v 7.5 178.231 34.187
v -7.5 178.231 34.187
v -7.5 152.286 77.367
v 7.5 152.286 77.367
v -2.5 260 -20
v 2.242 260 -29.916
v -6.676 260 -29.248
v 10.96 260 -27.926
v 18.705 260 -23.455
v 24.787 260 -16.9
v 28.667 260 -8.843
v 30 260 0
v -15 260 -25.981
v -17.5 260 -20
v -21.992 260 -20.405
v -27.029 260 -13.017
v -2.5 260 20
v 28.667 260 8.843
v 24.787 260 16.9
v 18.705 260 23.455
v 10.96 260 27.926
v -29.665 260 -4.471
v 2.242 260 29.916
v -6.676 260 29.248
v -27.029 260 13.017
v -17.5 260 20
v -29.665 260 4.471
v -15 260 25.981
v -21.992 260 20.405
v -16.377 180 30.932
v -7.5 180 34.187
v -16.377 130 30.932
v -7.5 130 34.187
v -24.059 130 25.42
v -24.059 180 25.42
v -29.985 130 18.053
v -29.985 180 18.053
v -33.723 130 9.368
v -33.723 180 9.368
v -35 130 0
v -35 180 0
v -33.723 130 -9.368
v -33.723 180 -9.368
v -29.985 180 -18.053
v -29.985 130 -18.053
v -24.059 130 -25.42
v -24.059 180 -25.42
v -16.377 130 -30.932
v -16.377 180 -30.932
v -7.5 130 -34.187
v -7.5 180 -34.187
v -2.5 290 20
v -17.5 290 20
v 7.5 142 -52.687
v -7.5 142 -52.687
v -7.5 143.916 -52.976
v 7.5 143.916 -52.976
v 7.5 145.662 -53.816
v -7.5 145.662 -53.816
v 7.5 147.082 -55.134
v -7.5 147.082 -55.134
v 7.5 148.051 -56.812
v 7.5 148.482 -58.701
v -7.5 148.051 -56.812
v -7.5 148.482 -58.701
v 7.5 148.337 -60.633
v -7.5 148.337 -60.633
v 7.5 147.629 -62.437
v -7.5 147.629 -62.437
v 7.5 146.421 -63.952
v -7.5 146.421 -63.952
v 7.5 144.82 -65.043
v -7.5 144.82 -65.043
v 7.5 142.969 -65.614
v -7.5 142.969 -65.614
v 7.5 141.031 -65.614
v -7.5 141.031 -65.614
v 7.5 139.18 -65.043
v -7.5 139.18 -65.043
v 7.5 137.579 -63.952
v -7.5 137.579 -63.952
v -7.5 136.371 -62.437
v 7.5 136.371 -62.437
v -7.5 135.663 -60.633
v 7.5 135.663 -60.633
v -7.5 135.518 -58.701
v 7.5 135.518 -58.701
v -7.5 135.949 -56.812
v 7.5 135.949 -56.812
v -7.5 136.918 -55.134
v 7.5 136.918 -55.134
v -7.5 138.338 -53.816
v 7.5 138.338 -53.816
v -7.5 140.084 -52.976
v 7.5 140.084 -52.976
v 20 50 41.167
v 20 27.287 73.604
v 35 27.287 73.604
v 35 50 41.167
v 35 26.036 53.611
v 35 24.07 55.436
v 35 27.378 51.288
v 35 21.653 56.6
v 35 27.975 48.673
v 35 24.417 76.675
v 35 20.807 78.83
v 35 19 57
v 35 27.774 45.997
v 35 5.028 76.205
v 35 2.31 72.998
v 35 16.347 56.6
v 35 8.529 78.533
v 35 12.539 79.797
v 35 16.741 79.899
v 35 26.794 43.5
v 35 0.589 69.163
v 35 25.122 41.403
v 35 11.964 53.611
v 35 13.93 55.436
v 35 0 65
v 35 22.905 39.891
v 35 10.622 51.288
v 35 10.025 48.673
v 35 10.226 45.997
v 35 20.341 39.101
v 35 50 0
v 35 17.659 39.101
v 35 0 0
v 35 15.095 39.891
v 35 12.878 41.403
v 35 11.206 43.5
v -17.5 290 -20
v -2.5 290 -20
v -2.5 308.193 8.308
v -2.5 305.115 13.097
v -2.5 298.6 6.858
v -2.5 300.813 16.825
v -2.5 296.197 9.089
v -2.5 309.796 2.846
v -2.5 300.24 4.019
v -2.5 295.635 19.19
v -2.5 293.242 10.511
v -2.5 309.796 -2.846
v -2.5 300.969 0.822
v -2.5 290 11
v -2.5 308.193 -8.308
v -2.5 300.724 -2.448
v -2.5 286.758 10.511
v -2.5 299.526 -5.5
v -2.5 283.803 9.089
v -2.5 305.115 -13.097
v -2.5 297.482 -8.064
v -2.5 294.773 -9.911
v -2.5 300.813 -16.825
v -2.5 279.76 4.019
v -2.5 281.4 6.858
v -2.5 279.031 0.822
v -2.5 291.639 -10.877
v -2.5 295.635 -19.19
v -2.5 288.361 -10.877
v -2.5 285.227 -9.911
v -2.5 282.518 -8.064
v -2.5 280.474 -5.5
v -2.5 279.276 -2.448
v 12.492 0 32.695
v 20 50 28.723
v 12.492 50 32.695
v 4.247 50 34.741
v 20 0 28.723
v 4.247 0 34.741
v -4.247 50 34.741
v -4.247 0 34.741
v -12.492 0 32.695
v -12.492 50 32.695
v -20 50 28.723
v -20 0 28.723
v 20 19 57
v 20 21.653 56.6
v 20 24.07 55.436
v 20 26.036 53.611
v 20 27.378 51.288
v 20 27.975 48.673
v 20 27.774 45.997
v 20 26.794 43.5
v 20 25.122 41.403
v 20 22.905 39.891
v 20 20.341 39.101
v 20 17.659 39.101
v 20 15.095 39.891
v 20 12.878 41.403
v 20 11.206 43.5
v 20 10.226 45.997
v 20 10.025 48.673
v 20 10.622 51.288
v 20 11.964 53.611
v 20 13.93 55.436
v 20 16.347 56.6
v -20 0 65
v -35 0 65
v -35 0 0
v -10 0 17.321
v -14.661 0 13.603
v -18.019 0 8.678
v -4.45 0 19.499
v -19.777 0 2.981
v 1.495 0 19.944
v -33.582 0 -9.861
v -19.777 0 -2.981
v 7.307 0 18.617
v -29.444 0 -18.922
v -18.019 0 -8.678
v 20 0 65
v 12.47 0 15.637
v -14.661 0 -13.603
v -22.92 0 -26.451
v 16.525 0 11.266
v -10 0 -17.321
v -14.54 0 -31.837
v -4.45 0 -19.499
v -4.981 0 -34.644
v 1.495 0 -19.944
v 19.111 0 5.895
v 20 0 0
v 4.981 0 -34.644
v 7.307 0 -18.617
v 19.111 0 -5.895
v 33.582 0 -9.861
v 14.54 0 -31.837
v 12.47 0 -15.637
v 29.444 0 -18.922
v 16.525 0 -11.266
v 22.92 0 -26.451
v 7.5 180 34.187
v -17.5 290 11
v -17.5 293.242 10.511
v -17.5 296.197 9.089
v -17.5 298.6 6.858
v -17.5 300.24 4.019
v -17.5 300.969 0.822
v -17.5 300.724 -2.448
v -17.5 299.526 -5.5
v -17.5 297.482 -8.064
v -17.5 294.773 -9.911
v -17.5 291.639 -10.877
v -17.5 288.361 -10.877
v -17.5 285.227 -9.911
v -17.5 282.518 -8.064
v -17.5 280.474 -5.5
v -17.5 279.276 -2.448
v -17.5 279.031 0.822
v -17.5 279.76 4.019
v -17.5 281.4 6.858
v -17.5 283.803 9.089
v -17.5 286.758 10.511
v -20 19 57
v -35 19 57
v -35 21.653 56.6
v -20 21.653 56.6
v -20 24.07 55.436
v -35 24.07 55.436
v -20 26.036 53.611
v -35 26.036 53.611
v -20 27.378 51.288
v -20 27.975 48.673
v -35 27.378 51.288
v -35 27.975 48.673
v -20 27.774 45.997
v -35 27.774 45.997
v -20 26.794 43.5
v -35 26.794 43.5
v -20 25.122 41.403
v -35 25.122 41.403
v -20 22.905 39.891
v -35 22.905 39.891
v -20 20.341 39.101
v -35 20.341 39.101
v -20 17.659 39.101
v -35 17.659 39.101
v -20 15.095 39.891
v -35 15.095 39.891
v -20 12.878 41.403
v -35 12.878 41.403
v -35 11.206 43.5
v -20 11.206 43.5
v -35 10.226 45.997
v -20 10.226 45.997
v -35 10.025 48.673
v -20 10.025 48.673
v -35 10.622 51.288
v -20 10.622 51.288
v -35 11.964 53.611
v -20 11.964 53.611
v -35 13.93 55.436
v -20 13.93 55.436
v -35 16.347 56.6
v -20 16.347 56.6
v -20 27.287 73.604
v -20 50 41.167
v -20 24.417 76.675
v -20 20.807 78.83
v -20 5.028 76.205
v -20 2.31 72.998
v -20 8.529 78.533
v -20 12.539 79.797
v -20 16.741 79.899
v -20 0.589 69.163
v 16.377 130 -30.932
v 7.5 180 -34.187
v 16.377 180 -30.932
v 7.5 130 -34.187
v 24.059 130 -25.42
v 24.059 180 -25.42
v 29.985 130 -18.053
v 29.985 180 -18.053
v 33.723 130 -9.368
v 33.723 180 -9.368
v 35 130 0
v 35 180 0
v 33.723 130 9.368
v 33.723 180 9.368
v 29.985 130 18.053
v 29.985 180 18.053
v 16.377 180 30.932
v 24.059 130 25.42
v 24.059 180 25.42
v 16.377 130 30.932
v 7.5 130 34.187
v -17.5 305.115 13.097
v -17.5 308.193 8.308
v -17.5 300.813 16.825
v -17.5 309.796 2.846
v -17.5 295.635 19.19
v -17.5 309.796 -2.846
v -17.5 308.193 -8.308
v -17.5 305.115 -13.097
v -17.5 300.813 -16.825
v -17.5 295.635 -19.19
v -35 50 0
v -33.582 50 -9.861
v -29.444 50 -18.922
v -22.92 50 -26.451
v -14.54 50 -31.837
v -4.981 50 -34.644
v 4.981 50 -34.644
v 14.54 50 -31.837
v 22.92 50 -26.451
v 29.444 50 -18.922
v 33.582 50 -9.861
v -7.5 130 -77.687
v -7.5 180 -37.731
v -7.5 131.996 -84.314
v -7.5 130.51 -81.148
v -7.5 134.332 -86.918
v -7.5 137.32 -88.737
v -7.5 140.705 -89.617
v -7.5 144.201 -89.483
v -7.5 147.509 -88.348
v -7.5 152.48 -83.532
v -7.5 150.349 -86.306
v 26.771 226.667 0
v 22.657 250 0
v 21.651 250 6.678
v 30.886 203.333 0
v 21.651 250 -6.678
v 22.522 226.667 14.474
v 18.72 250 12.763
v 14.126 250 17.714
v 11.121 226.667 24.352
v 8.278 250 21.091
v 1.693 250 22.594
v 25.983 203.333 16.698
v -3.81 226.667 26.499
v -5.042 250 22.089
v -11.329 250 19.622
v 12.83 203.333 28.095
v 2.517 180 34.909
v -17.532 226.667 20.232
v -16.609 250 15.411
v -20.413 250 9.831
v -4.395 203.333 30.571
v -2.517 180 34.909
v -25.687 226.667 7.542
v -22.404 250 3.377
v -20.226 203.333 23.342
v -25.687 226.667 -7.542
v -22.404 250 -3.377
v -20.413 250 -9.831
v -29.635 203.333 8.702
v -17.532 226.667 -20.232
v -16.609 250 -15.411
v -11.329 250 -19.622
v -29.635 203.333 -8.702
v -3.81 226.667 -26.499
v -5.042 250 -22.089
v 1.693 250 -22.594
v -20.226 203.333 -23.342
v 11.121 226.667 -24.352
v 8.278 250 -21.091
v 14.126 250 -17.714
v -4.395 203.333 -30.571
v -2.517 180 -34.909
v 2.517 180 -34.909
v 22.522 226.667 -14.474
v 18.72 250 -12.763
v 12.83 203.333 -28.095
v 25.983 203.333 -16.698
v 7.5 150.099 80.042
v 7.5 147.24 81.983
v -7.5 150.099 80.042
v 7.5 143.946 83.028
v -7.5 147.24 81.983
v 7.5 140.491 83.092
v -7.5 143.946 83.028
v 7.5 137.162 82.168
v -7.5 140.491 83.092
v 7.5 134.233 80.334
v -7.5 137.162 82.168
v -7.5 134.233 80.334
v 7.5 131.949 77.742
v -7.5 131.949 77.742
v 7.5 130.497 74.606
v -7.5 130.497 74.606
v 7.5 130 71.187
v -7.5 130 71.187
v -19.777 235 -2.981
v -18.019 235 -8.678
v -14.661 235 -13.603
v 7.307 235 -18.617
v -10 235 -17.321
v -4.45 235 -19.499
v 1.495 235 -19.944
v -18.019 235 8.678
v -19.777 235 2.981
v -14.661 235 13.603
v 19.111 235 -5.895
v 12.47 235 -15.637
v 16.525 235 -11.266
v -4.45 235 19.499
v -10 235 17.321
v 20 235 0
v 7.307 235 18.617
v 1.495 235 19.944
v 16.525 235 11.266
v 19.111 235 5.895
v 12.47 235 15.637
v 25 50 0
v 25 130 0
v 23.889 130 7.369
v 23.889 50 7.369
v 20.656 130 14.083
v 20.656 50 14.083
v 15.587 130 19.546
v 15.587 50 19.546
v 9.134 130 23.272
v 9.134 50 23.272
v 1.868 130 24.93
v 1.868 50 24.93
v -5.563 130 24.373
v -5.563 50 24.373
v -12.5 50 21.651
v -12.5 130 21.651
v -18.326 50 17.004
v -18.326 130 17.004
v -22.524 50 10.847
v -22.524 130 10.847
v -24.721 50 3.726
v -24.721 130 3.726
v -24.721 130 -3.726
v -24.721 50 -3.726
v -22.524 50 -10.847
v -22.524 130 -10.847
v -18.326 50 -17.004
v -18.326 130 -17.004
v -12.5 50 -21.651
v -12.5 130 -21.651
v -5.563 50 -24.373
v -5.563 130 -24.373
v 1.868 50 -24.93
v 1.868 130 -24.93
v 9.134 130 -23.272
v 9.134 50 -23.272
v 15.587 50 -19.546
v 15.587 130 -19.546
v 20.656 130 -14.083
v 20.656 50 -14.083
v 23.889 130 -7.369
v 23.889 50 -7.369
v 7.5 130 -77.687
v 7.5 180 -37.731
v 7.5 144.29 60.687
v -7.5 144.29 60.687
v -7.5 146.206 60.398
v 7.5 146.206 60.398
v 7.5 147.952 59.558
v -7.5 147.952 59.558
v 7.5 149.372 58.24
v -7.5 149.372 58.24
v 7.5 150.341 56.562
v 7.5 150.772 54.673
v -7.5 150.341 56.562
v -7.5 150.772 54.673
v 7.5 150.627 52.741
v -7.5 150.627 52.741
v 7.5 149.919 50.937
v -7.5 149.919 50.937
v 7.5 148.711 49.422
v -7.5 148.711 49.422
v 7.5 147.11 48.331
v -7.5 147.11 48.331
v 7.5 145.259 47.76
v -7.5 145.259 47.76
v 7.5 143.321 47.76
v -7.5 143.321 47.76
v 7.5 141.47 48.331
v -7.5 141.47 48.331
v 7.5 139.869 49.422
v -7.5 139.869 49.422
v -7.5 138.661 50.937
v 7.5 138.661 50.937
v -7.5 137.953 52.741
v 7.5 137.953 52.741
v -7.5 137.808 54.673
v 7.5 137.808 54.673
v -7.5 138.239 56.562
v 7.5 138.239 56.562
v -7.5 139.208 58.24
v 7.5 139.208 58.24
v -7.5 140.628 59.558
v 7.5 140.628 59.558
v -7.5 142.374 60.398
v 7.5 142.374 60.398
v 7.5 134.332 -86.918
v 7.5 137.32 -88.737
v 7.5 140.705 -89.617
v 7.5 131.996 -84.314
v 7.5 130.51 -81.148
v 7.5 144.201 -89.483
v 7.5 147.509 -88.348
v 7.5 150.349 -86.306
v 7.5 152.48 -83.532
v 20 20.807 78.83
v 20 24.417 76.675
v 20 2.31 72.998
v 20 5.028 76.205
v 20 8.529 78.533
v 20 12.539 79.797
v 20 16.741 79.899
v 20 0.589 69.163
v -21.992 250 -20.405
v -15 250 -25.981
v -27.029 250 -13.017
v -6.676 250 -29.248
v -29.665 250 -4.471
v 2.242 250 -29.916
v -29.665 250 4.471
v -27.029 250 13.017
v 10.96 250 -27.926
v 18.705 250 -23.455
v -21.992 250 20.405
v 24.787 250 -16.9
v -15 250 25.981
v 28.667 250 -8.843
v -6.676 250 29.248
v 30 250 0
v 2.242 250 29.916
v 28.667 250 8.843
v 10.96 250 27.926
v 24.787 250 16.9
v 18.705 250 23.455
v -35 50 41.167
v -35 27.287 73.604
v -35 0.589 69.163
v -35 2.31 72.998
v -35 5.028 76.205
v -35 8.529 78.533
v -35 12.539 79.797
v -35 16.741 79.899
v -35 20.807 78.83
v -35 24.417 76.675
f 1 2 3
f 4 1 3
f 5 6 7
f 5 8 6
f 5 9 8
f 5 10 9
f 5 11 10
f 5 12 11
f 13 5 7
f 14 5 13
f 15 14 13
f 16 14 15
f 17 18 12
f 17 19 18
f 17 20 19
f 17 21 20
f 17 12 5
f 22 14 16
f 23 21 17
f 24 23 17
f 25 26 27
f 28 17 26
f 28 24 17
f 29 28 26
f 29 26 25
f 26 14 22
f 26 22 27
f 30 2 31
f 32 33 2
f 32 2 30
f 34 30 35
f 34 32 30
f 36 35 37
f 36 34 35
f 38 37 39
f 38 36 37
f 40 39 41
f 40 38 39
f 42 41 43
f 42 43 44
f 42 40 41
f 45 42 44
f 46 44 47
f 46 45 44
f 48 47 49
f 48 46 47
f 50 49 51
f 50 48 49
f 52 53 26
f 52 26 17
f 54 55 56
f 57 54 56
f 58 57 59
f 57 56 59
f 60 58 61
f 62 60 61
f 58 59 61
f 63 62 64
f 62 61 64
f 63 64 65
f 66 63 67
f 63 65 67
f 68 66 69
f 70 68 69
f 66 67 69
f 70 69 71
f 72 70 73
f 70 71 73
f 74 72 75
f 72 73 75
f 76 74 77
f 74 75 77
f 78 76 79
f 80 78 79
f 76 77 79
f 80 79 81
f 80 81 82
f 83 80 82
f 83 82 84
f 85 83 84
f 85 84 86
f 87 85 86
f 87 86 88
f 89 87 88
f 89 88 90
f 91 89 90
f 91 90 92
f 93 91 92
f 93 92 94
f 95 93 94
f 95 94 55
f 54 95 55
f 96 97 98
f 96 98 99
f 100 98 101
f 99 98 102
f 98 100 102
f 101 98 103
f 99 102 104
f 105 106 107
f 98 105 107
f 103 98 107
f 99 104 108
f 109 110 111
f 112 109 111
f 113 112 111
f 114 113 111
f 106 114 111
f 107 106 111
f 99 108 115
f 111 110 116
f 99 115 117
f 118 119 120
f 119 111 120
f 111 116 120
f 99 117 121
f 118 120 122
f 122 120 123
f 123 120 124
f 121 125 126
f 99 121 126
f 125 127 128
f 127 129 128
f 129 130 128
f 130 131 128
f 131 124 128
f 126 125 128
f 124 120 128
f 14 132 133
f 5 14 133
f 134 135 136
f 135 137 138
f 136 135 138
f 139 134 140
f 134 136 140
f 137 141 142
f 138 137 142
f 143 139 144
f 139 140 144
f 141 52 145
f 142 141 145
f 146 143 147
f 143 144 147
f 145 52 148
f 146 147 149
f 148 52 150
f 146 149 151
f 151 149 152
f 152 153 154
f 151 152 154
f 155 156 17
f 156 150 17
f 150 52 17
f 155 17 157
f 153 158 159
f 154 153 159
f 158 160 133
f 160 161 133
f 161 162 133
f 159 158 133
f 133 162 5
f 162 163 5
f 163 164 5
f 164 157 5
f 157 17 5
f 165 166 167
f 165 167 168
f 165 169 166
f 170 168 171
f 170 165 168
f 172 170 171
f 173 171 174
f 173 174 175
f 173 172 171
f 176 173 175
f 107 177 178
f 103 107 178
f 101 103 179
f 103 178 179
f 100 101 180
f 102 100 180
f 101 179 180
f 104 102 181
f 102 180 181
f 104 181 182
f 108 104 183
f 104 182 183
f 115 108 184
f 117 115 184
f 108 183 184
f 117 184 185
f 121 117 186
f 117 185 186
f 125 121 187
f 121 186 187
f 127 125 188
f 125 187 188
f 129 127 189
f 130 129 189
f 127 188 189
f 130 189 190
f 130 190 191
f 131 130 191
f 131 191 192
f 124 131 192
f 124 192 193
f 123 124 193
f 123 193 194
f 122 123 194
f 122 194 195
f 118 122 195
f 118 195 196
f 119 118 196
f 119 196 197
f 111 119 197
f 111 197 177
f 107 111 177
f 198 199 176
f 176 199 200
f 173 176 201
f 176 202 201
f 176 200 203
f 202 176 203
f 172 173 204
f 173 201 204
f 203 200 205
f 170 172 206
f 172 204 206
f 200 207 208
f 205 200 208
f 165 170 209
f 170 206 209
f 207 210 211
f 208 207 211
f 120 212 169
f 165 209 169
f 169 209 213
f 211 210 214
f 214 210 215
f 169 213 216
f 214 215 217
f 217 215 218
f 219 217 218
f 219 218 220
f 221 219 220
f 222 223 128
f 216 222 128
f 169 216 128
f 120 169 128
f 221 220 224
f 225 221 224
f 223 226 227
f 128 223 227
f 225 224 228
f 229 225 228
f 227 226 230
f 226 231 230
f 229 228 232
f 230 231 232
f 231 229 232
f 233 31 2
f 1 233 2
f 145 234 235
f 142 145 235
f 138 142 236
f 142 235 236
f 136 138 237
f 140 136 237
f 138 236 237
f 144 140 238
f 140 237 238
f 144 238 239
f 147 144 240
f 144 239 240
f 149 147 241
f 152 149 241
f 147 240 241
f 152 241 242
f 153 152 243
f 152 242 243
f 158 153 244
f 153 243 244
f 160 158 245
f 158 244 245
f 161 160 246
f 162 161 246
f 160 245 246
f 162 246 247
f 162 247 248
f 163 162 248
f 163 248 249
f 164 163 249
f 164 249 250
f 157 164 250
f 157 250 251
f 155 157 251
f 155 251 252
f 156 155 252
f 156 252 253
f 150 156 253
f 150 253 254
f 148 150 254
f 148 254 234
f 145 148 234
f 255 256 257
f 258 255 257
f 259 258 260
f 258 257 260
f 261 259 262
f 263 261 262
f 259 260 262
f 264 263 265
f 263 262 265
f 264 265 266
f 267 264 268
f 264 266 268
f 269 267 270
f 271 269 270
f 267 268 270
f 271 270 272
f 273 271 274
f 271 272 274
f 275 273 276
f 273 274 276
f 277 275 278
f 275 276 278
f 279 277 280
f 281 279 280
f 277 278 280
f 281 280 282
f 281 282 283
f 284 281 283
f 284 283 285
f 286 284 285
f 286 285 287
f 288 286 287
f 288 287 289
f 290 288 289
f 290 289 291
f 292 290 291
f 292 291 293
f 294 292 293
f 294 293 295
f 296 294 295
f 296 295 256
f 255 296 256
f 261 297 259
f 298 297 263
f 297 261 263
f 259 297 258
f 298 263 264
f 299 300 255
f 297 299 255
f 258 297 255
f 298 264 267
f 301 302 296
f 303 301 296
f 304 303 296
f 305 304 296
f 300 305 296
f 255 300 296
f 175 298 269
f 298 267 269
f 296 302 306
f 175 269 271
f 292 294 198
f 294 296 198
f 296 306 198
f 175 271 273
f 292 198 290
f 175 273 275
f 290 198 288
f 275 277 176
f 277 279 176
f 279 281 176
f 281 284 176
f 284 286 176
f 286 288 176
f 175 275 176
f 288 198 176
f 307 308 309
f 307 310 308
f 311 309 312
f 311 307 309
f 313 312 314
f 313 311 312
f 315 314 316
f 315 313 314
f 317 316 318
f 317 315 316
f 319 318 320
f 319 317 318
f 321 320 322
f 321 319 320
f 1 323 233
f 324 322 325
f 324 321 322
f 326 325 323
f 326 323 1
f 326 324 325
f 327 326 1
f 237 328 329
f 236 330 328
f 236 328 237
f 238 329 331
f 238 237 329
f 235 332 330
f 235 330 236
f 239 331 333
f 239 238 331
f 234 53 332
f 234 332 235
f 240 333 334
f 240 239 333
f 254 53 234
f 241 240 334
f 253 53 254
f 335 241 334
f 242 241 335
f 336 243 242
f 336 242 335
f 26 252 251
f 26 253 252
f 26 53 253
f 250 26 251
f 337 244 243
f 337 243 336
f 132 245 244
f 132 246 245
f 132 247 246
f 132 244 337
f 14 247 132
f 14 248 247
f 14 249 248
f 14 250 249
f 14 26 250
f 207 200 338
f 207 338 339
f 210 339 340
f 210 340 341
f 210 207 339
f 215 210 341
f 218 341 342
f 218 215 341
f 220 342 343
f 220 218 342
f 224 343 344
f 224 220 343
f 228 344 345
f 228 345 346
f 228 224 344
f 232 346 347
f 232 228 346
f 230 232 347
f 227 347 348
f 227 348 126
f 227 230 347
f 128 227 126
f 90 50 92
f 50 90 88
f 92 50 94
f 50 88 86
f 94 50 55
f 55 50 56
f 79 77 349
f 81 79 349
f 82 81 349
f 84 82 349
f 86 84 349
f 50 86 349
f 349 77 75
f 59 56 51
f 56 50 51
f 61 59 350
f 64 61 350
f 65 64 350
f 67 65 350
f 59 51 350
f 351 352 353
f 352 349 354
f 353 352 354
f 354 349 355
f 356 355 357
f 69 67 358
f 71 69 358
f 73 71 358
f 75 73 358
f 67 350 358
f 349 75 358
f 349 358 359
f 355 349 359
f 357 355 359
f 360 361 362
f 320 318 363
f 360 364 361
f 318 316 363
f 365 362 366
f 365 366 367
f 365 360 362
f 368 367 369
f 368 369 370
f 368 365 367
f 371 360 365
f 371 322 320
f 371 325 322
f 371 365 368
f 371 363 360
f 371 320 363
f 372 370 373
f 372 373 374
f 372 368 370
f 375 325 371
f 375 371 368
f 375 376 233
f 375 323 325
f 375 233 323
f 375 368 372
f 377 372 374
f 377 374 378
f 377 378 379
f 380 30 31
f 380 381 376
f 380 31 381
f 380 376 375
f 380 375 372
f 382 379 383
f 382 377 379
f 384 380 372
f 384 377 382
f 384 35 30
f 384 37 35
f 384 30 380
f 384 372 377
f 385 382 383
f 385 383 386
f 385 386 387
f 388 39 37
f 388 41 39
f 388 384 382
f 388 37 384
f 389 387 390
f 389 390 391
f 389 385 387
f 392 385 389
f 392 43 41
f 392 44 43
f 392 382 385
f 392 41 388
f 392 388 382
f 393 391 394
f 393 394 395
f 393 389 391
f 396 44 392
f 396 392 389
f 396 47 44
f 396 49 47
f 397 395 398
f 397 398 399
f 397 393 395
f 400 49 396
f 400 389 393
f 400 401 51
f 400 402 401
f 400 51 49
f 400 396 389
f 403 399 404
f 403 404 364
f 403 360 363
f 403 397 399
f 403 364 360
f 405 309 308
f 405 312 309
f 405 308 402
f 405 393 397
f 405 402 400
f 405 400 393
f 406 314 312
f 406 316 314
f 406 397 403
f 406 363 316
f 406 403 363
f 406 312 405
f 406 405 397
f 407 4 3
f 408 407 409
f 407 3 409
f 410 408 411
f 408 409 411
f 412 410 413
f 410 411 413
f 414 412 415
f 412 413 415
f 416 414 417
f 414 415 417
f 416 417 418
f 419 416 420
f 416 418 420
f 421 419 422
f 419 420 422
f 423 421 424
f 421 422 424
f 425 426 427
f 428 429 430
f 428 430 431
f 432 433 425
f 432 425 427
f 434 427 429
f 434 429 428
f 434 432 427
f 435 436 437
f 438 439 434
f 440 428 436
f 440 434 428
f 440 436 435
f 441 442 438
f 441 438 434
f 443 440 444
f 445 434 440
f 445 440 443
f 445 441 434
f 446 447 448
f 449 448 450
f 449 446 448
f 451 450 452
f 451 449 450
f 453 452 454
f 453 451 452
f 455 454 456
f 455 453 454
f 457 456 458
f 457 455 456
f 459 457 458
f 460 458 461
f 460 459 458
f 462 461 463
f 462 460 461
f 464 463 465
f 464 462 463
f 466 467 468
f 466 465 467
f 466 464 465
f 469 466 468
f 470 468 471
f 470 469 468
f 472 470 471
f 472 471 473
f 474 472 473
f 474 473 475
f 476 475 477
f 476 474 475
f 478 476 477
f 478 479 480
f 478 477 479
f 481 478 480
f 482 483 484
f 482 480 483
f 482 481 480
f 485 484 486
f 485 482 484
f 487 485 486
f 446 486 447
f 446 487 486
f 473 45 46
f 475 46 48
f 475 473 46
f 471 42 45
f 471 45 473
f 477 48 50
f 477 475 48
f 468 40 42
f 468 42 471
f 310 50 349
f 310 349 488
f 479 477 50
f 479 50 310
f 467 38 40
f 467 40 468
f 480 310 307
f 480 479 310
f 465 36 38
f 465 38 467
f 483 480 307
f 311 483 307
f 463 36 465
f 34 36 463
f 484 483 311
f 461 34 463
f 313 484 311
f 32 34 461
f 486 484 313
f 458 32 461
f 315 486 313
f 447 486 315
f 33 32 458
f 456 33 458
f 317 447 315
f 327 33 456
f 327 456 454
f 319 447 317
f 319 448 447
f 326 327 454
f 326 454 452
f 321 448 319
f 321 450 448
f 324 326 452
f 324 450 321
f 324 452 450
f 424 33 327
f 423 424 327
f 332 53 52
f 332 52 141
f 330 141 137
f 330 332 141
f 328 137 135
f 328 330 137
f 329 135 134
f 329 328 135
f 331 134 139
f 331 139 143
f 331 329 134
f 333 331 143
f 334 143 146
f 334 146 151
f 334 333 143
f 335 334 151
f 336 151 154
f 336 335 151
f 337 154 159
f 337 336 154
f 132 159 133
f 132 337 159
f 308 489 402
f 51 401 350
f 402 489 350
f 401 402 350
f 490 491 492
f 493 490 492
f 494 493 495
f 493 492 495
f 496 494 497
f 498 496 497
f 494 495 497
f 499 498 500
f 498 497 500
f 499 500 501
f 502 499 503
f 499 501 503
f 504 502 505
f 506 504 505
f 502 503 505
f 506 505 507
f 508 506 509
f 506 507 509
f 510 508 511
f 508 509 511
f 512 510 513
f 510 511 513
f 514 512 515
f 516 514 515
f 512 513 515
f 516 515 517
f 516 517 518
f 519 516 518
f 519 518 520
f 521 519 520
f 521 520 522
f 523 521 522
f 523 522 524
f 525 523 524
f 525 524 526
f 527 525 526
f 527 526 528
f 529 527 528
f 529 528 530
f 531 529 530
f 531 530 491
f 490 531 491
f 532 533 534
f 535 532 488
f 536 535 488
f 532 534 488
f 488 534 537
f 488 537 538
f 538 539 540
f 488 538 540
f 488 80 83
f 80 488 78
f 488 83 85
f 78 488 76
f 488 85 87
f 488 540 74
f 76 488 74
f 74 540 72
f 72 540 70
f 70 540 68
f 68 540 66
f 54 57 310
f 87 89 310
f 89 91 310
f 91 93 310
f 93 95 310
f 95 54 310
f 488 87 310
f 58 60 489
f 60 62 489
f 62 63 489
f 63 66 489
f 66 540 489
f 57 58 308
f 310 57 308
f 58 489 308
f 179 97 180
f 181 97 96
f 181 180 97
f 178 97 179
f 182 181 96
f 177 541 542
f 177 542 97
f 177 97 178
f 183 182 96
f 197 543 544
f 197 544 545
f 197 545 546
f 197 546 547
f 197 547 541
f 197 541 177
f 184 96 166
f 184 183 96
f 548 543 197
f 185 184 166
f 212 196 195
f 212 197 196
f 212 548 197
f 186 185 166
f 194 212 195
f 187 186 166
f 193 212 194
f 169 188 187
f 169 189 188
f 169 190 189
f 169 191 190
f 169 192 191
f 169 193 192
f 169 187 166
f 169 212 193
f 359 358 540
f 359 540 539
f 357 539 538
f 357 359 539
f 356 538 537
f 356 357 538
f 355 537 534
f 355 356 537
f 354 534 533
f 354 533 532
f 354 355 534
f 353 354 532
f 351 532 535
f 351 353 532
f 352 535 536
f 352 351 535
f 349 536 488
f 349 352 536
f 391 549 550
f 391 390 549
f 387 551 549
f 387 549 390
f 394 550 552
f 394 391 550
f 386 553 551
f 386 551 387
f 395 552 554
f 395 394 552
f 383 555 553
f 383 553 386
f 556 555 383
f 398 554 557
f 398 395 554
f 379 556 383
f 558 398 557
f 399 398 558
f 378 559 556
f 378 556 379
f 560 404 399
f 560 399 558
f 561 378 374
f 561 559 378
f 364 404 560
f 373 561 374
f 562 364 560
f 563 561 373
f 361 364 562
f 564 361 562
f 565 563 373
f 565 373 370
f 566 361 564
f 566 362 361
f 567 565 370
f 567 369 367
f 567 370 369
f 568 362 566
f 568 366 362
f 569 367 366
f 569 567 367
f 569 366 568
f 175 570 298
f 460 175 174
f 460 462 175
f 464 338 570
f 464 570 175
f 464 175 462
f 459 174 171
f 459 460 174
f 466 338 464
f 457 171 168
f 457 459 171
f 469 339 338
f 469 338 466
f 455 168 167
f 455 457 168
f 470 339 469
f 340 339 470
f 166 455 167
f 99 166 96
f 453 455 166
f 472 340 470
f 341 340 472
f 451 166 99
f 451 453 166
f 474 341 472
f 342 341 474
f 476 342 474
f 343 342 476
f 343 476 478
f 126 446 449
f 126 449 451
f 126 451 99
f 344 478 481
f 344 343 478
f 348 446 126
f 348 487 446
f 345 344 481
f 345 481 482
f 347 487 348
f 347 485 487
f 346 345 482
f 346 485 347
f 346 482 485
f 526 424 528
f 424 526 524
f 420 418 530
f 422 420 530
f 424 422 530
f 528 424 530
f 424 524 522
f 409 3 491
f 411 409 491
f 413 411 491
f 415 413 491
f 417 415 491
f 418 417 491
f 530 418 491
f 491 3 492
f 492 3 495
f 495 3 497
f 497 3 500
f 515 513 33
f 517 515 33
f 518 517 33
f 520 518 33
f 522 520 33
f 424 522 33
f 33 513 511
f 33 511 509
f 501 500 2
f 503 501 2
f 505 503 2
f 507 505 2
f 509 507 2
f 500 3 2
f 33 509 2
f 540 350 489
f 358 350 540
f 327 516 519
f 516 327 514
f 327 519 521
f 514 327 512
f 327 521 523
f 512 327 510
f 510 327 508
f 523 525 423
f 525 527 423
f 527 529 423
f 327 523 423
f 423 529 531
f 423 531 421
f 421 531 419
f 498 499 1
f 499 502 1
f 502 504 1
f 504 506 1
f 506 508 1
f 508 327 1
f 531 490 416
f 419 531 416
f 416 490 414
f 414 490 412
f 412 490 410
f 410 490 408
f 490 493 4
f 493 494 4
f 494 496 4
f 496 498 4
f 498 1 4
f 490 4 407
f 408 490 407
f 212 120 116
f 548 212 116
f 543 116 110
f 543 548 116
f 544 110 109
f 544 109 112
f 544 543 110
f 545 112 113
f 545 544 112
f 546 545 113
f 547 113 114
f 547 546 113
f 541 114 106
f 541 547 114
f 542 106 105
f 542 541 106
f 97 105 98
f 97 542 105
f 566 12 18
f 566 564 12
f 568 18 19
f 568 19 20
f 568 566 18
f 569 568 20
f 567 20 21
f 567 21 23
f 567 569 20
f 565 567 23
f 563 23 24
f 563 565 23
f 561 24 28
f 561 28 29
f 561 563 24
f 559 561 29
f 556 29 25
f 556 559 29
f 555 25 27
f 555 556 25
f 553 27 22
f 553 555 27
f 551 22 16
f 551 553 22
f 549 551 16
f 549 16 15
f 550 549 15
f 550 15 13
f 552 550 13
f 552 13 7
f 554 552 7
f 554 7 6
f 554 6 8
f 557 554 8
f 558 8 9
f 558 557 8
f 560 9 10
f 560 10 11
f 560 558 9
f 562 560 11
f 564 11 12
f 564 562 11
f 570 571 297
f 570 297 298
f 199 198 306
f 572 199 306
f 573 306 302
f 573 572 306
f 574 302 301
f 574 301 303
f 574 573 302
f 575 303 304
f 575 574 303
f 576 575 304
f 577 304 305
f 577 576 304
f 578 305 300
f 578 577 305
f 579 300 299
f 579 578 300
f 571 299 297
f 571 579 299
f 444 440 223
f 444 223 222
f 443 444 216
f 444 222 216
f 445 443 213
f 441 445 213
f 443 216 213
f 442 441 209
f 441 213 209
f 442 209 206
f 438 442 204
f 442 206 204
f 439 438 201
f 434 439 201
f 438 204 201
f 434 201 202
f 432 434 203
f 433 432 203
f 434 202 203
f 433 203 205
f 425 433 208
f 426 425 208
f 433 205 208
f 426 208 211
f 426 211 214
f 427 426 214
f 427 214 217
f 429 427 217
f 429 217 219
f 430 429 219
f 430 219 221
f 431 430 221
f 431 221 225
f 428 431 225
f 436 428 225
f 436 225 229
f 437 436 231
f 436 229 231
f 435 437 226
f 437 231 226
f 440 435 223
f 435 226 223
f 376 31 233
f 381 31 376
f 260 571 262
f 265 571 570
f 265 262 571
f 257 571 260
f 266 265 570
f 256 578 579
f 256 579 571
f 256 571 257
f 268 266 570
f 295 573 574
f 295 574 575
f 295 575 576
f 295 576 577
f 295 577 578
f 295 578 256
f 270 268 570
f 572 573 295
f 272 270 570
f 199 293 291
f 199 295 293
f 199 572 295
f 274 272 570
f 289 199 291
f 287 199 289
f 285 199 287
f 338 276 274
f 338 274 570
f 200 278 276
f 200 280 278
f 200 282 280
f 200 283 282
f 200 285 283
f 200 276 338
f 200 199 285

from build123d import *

# Parameters (mm, degrees)
SKETCH2_W           = 15
SKETCH2_H           = 93.194890567
BOSS_EXTRUDE2_DEPTH = 50
SKETCH3_R           = 9
CUT_EXTRUDE6_DEPTH  = 105
BOSS_EXTRUDE4_DEPTH = 50
SKETCH7_R           = 6.5
CUT_EXTRUDE7_DEPTH  = 105
SKETCH8_R           = 20
CUT_EXTRUDE8_DEPTH  = 235
SKETCH11_W          = 15
SKETCH11_H          = 40
BOSS_EXTRUDE5_DEPTH = 60
SKETCH12_R          = 11
CUT_EXTRUDE9_DEPTH  = 60


with BuildPart() as part:
    # Sketch1 → Revolve1 (revolve)
    with BuildSketch(Plane.XY):
        Polygon((0, 260), (30, 260), (30, 250), (22.65711135, 250), (35, 180), (35, 130), (25, 130), (25, 50), (35, 50), (35, 0), (0, 0), align=None)
    revolve(axis=Axis((0, 462.148353897, 0), (0, -1, 0)))

    # Sketch2 → Boss-Extrude2 (add)
    with BuildSketch(Plane(origin=(0, 0, 0), x_dir=(1, 0, 0), z_dir=(0, 1, 0))):
        with Locations((-27.5, -46.597445284)):
            Rectangle(SKETCH2_W, SKETCH2_H)
        with Locations((27.5, -46.597445284)):
            Rectangle(SKETCH2_W, SKETCH2_H)
    extrude(amount=BOSS_EXTRUDE2_DEPTH)

    # Sketch3 → Cut-Extrude6 (cut)
    with BuildSketch(Plane.ZY.offset(35)):
        with Locations((48, 19)):
            Circle(SKETCH3_R)
        with BuildLine():
            Line((73.603646545, 27.287280664), (41.166521698, 50))
            Line((41.166521698, 50), (93.194890567, 50))
            Line((93.194890567, 50), (93.194890567, 0))
            Line((93.194890567, 0), (65, 0))
            ThreePointArc((65, 0), (79.305754261, 10.489413007), (73.603646545, 27.287280664))
        make_face()
    extrude(amount=-CUT_EXTRUDE6_DEPTH, mode=Mode.SUBTRACT)

    # Sketch6 → Boss-Extrude4 (add)
    with BuildSketch(Plane(origin=(0, 180, 0), x_dir=(1, 0, 0), z_dir=(0, 1, 0))):
        Polygon((0, 0), (7.5, 0), (7.5, -91.66287292), (-7.5, -91.66287292), (-7.5, 0), align=None)
        Polygon((7.5, 91.66287292), (7.5, 9.253142795), (-7.5, 9.974305291), (-7.5, 91.66287292), align=None)
    extrude(amount=-BOSS_EXTRUDE4_DEPTH)

    # Sketch7 → Cut-Extrude7 (cut)
    with BuildSketch(Plane.ZY.offset(7.5)):
        with BuildLine():
            ThreePointArc((-83.531871553, 152.480329712), (-89.300855909, 138.980393779), (-77.686985828, 130))
            Line((-77.686985828, 130), (-91.66287292, 130))
            Line((-91.66287292, 130), (-91.66287292, 180))
            Line((-91.66287292, 180), (-37.731448931, 180))
            Line((-37.731448931, 180), (-83.531871553, 152.480329712))
        make_face()
        with BuildLine():
            Line((34.186985828, 180), (34.186985828, 178.231443671))
            Line((34.186985828, 178.231443671), (77.367442727, 152.286007608))
            ThreePointArc((77.367442727, 152.286007608), (82.750551266, 138.793139487), (71.186985828, 130))
            Line((71.186985828, 130), (91.66287292, 130))
            Line((91.66287292, 130), (91.66287292, 180))
            Line((91.66287292, 180), (34.186985828, 180))
        make_face()
        with Locations((54.186985828, 144.29)):
            Circle(SKETCH7_R)
        with Locations((-59.186985828, 142)):
            Circle(SKETCH7_R)
    extrude(amount=-CUT_EXTRUDE7_DEPTH, mode=Mode.SUBTRACT)

    # Sketch8 → Cut-Extrude8 (cut)
    with BuildSketch(Plane.XZ):
        Circle(SKETCH8_R)
    extrude(amount=-CUT_EXTRUDE8_DEPTH, mode=Mode.SUBTRACT)

    # Sketch11 → Boss-Extrude5 (add)
    with BuildSketch(Plane(origin=(0, 260, 0), x_dir=(1, 0, 0), z_dir=(0, 1, 0))):
        with Locations((-10, 0)):
            Rectangle(SKETCH11_W, SKETCH11_H)
    extrude(amount=BOSS_EXTRUDE5_DEPTH)

    # Sketch12 → Cut-Extrude9 (cut)
    with BuildSketch(Plane.ZY.offset(17.5)):
        with Locations((0, 290)):
            Circle(SKETCH12_R)
        with BuildLine():
            Line((-20, 290), (-20, 320))
            Line((-20, 320), (20, 320))
            Line((20, 320), (20, 290))
            ThreePointArc((20, 290), (0, 310), (-20, 290))
        make_face()
    extrude(amount=-CUT_EXTRUDE9_DEPTH, mode=Mode.SUBTRACT)


solid = part.part
